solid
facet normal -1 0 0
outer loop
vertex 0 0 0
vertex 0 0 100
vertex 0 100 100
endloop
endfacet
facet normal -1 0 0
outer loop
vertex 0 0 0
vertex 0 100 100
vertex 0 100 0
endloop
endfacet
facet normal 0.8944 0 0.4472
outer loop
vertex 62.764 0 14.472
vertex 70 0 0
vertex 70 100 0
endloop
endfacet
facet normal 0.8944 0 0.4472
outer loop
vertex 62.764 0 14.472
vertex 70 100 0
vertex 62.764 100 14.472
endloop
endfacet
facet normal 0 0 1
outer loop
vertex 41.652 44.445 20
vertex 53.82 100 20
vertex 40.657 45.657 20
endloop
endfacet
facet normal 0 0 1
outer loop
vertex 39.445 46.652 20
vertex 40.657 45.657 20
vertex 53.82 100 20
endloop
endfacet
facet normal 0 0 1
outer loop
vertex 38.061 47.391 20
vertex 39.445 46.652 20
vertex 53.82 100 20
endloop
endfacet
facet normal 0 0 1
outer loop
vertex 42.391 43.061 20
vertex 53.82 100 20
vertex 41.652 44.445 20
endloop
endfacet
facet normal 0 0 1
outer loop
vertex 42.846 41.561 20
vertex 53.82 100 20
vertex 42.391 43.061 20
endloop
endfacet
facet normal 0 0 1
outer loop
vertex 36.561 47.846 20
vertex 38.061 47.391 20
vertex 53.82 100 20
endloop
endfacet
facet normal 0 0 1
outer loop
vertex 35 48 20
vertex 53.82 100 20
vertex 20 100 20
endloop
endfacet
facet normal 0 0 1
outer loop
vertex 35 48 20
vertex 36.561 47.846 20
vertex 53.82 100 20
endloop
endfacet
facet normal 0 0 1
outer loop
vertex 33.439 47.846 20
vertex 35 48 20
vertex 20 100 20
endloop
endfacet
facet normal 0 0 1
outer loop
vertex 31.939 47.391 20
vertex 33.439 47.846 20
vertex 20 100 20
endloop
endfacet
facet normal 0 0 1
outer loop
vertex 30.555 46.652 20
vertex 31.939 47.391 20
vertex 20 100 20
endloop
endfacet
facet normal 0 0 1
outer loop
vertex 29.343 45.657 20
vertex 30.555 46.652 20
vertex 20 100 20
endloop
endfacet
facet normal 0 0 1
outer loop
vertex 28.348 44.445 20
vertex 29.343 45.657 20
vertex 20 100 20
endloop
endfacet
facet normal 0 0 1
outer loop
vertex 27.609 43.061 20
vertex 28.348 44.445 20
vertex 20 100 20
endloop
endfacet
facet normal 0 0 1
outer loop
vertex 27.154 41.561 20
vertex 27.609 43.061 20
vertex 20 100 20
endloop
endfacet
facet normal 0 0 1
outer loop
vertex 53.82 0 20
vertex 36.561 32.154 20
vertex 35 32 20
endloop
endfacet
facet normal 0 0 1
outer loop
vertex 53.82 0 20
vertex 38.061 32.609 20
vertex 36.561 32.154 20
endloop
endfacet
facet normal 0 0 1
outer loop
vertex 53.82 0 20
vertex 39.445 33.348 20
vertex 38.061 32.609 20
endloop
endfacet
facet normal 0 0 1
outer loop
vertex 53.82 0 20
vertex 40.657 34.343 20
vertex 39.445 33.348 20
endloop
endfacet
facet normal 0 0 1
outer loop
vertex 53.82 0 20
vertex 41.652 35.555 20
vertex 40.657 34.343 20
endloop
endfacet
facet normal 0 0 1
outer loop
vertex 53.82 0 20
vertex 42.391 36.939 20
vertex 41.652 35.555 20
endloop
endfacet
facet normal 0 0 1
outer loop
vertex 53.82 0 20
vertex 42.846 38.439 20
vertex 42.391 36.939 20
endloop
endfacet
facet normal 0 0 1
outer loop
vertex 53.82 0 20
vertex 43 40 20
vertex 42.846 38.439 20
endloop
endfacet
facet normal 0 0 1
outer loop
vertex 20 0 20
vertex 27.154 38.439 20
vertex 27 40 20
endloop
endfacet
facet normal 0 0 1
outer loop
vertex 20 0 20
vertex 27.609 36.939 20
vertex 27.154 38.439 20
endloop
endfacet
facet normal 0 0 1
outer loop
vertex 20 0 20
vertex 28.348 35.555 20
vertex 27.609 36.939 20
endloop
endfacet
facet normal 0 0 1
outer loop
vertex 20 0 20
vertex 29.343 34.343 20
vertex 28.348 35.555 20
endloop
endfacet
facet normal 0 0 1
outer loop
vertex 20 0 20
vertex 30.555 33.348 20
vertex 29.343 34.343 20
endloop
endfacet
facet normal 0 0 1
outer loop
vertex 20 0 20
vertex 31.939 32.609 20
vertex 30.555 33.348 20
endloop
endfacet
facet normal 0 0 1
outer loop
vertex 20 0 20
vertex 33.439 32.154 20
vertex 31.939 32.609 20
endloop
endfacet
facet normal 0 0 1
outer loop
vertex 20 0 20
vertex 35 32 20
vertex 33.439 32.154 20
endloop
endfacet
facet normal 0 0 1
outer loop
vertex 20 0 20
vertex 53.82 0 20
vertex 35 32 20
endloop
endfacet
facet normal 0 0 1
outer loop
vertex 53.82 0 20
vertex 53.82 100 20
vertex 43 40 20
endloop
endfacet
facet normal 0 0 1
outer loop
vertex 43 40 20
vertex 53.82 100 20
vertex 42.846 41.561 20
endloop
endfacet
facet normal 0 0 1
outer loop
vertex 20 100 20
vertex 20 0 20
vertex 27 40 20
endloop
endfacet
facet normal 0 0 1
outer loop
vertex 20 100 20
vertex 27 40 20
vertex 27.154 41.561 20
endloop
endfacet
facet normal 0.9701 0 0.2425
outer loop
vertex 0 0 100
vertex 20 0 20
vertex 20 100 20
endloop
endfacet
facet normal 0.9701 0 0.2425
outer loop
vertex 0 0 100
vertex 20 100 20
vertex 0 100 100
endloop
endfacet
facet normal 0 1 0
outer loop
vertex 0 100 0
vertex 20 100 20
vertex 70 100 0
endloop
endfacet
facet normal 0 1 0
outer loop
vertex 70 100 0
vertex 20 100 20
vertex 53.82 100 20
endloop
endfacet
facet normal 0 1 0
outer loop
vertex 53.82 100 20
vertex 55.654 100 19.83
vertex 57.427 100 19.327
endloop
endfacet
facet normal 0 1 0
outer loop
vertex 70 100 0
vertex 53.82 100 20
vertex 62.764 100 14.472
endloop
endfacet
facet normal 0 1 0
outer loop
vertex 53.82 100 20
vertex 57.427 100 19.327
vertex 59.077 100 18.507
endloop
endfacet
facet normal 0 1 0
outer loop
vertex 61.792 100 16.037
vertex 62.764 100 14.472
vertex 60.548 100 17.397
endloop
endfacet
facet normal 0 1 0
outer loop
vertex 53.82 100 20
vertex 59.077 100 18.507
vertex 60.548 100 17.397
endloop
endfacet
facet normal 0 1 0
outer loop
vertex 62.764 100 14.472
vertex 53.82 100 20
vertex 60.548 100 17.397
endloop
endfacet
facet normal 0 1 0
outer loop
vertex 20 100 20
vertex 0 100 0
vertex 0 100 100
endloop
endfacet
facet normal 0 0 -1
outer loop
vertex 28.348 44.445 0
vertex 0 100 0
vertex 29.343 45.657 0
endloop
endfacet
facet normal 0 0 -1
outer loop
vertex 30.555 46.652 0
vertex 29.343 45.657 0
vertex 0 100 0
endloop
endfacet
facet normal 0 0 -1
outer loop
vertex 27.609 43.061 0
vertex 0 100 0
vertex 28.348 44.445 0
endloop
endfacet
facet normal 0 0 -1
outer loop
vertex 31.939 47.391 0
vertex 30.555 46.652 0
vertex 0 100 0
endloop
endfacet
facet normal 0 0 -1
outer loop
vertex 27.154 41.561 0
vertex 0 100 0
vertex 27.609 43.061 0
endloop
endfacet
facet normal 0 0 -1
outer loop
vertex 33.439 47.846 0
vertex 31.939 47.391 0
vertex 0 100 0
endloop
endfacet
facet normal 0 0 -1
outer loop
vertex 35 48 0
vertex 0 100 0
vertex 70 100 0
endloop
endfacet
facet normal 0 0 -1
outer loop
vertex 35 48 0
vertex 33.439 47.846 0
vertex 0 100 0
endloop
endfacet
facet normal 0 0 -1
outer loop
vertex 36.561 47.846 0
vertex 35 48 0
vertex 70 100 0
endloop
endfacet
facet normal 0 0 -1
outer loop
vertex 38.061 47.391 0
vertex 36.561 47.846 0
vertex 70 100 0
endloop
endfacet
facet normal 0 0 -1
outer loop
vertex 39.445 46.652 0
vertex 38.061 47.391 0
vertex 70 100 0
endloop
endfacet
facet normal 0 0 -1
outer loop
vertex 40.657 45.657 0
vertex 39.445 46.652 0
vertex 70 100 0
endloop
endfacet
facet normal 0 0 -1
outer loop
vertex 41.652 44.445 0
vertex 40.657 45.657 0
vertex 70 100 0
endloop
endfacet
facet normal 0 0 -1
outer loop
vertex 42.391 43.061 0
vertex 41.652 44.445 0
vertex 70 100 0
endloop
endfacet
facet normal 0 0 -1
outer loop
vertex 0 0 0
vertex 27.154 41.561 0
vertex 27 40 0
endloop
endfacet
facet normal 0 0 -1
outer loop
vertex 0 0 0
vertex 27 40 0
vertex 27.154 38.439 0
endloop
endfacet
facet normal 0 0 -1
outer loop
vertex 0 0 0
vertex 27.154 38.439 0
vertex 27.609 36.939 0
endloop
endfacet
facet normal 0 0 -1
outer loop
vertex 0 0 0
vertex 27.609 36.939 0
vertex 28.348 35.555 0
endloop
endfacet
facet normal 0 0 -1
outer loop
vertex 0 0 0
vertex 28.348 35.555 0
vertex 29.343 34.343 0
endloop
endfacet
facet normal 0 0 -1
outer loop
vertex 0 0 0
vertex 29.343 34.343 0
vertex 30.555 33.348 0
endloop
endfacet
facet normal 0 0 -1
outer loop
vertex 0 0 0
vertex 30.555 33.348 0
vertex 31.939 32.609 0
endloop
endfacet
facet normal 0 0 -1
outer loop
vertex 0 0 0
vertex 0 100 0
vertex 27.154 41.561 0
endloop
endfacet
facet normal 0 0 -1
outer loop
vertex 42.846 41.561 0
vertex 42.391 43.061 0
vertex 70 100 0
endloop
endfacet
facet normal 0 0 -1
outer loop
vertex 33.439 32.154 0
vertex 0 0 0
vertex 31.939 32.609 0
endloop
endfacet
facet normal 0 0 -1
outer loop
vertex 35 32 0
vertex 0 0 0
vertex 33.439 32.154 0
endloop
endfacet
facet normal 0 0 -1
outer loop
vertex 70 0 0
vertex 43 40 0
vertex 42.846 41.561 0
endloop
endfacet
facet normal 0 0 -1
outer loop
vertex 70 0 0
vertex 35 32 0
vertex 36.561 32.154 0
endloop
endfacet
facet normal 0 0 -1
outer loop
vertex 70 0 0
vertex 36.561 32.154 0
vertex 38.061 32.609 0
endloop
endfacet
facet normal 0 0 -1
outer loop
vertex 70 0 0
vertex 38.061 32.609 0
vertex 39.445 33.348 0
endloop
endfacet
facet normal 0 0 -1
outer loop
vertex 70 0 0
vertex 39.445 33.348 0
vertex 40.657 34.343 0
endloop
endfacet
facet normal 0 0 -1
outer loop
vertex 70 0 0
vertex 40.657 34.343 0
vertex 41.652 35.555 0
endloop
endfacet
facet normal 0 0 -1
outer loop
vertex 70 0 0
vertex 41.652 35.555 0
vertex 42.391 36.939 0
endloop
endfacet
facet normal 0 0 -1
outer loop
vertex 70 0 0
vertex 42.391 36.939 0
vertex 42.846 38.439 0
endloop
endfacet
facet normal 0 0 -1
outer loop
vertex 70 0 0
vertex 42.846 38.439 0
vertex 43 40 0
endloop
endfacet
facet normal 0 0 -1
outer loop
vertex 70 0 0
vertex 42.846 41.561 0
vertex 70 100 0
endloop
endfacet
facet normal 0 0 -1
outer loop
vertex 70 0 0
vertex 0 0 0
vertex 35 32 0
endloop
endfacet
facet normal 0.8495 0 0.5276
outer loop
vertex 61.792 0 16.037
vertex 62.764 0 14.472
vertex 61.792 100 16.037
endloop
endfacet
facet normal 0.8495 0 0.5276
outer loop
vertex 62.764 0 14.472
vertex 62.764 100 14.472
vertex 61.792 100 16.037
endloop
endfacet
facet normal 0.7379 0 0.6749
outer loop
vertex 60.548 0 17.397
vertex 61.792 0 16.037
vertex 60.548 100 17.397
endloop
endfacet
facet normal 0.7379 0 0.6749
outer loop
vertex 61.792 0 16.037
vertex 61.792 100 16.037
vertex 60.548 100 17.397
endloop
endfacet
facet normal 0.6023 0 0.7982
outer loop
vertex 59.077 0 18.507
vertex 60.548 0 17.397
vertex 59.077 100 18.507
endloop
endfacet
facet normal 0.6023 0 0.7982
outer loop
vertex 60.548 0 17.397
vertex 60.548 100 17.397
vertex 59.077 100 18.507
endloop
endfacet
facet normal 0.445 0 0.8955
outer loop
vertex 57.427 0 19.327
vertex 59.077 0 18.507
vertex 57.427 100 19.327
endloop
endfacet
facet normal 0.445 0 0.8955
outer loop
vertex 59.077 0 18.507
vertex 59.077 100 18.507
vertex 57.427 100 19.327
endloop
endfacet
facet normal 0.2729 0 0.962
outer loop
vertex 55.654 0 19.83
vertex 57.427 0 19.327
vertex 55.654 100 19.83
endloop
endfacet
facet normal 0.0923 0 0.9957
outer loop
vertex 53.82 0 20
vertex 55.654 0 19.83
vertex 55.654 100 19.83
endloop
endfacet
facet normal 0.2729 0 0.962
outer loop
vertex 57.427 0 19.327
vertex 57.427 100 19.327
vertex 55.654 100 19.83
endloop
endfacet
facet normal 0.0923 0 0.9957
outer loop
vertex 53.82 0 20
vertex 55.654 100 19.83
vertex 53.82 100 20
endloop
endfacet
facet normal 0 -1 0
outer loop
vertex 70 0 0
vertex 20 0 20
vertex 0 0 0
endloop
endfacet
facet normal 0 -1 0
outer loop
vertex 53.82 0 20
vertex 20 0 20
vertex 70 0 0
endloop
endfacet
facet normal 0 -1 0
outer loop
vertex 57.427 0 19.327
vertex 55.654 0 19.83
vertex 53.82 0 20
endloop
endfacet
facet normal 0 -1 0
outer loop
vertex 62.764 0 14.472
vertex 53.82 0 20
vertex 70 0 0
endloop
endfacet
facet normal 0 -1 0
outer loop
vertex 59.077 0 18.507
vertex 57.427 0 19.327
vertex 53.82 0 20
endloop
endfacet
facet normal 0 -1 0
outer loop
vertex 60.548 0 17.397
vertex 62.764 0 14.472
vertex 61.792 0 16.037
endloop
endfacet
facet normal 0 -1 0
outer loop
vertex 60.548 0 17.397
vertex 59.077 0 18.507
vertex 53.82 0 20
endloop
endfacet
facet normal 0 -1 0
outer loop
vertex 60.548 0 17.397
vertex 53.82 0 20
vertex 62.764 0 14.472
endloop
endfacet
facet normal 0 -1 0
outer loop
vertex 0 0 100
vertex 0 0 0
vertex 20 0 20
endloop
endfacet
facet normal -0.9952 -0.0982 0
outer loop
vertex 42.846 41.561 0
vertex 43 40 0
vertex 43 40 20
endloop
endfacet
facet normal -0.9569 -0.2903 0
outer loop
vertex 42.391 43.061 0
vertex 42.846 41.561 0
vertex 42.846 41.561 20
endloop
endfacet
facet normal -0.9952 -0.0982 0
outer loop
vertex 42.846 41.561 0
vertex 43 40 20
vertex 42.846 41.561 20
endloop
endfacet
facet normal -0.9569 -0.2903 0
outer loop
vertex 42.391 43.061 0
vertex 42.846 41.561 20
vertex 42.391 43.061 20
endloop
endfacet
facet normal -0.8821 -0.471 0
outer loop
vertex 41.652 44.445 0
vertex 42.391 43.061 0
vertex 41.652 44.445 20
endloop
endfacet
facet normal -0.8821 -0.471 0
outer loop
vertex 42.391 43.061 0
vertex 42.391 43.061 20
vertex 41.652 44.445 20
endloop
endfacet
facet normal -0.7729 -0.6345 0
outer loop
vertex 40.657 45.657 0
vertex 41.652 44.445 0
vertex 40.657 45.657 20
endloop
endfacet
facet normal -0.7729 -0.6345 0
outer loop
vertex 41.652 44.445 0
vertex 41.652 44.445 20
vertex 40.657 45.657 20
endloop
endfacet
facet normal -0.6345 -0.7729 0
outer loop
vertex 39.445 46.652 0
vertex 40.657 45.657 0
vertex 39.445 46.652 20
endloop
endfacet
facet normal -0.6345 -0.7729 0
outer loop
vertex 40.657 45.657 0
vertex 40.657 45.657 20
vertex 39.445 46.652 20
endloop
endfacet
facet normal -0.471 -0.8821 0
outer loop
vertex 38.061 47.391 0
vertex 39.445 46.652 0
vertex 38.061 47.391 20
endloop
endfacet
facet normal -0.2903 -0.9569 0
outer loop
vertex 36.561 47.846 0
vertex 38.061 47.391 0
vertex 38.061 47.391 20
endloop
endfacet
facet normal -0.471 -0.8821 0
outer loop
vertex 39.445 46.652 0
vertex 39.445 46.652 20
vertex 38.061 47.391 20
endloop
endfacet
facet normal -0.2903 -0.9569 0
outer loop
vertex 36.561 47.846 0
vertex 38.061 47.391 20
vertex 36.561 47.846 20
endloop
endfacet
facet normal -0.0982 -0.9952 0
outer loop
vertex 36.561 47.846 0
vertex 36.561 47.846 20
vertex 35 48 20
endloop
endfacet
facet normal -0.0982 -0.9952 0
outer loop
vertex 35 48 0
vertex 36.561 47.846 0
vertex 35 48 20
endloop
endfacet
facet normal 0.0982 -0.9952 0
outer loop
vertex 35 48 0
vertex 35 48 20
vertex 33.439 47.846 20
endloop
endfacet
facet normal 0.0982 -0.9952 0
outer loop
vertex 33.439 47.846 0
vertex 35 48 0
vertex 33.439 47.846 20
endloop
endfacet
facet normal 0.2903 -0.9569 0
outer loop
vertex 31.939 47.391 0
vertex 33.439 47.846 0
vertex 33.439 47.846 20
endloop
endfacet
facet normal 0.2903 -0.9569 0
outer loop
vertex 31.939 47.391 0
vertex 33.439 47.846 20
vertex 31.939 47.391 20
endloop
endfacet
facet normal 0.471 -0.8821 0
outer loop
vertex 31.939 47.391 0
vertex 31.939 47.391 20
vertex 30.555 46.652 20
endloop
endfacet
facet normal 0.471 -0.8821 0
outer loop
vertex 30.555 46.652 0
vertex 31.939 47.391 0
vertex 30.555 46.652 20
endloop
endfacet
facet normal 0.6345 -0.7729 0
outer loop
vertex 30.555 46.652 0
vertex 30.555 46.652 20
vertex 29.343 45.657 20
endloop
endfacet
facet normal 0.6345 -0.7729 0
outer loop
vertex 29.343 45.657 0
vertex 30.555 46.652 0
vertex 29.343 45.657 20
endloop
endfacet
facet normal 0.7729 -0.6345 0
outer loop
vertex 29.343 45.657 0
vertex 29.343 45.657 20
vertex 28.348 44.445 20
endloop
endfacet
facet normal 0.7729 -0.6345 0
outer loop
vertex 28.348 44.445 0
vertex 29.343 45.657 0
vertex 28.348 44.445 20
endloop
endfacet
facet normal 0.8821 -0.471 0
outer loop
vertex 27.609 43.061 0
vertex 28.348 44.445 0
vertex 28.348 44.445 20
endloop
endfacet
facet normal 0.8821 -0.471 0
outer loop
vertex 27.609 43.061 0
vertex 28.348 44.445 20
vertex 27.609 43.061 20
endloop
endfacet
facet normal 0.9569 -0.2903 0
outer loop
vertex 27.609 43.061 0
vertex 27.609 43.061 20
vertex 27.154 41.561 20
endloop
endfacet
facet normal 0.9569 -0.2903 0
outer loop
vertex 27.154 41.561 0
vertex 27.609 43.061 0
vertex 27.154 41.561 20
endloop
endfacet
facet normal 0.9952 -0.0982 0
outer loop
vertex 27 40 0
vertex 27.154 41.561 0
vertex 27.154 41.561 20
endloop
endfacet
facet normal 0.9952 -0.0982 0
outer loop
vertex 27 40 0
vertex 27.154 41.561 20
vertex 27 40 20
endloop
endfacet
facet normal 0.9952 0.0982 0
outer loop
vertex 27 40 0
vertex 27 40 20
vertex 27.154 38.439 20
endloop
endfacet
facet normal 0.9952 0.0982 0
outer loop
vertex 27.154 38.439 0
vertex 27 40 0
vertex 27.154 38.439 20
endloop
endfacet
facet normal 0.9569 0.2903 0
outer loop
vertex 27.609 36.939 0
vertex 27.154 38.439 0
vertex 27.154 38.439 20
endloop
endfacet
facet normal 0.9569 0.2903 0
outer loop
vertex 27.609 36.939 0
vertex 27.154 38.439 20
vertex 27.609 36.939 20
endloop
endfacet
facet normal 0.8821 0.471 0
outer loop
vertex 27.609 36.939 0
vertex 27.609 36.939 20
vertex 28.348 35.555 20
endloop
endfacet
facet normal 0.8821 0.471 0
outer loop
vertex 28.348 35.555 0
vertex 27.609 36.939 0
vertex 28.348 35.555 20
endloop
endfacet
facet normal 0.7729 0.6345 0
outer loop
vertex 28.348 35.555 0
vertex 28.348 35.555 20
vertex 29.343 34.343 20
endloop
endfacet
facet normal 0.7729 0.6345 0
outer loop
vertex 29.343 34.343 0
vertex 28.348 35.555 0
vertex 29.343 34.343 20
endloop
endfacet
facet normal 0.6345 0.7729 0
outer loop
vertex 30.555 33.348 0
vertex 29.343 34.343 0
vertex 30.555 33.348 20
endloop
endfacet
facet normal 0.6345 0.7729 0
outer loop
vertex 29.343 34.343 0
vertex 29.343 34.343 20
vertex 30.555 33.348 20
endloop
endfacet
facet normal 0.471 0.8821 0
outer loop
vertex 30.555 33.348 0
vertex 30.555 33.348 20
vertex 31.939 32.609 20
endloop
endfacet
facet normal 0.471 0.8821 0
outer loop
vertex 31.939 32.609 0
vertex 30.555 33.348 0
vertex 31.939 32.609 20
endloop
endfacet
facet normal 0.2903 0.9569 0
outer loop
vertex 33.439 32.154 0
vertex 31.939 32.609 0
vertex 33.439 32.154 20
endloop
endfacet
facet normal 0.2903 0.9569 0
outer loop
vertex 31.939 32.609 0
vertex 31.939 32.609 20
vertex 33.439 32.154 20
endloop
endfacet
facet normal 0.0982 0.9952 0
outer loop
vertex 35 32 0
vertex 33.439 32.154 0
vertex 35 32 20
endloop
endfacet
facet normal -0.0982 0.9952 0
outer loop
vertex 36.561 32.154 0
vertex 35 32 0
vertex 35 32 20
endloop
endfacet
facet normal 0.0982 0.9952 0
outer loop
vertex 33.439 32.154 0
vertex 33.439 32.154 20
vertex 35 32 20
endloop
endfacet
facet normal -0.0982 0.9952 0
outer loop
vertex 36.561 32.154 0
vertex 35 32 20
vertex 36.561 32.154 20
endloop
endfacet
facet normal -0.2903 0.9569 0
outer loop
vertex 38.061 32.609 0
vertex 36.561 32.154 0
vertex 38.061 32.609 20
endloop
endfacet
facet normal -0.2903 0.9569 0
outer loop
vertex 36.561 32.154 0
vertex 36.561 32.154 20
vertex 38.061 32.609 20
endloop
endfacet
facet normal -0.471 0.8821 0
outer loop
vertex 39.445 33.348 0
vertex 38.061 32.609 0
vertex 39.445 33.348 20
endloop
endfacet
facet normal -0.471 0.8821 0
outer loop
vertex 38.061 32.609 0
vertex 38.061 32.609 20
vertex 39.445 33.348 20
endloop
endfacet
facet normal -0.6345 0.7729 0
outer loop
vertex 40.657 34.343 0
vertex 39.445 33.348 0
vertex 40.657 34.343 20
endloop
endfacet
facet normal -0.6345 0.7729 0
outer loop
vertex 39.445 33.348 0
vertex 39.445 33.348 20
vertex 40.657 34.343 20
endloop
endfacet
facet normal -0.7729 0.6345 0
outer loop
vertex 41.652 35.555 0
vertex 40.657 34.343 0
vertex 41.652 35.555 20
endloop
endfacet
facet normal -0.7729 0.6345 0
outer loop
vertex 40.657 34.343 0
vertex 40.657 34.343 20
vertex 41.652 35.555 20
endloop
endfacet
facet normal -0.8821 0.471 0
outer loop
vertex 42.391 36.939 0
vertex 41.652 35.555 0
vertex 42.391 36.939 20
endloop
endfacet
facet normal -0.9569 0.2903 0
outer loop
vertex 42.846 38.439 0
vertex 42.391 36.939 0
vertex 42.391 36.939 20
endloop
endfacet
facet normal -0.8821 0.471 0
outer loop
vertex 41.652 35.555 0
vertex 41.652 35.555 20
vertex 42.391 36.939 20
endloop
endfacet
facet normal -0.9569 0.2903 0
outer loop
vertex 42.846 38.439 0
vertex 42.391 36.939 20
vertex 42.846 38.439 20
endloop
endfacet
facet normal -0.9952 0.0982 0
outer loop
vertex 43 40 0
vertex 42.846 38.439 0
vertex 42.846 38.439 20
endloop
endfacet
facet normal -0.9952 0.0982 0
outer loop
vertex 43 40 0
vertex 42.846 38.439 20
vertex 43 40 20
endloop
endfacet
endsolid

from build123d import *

# Parameters (mm, degrees)
F1_DEPTH = 100
F2_R     = 10
F3_R     = 8
F4_DEPTH = 20.001


with BuildPart() as f1:
    # F0 (on Front) → F1 (new body)
    with BuildSketch(Plane.XZ):
        Polygon((0, 100), (0, 0), (70, 0), (60, 20), (20, 20), align=None)
    extrude(amount=-F1_DEPTH)

    # F2
    f2_edges = [f1.edges().sort_by_distance(p)[0] for p in [
        (60, 50, 20),
    ]]
    fillet(f2_edges, radius=F2_R)

    # F3 (on face) → F4 (cut, through all)
    with BuildSketch(Plane.XY.offset(20)):
        with Locations((35, 40)):
            Circle(F3_R)
    extrude(amount=-F4_DEPTH, mode=Mode.SUBTRACT)


solid = f1.part
